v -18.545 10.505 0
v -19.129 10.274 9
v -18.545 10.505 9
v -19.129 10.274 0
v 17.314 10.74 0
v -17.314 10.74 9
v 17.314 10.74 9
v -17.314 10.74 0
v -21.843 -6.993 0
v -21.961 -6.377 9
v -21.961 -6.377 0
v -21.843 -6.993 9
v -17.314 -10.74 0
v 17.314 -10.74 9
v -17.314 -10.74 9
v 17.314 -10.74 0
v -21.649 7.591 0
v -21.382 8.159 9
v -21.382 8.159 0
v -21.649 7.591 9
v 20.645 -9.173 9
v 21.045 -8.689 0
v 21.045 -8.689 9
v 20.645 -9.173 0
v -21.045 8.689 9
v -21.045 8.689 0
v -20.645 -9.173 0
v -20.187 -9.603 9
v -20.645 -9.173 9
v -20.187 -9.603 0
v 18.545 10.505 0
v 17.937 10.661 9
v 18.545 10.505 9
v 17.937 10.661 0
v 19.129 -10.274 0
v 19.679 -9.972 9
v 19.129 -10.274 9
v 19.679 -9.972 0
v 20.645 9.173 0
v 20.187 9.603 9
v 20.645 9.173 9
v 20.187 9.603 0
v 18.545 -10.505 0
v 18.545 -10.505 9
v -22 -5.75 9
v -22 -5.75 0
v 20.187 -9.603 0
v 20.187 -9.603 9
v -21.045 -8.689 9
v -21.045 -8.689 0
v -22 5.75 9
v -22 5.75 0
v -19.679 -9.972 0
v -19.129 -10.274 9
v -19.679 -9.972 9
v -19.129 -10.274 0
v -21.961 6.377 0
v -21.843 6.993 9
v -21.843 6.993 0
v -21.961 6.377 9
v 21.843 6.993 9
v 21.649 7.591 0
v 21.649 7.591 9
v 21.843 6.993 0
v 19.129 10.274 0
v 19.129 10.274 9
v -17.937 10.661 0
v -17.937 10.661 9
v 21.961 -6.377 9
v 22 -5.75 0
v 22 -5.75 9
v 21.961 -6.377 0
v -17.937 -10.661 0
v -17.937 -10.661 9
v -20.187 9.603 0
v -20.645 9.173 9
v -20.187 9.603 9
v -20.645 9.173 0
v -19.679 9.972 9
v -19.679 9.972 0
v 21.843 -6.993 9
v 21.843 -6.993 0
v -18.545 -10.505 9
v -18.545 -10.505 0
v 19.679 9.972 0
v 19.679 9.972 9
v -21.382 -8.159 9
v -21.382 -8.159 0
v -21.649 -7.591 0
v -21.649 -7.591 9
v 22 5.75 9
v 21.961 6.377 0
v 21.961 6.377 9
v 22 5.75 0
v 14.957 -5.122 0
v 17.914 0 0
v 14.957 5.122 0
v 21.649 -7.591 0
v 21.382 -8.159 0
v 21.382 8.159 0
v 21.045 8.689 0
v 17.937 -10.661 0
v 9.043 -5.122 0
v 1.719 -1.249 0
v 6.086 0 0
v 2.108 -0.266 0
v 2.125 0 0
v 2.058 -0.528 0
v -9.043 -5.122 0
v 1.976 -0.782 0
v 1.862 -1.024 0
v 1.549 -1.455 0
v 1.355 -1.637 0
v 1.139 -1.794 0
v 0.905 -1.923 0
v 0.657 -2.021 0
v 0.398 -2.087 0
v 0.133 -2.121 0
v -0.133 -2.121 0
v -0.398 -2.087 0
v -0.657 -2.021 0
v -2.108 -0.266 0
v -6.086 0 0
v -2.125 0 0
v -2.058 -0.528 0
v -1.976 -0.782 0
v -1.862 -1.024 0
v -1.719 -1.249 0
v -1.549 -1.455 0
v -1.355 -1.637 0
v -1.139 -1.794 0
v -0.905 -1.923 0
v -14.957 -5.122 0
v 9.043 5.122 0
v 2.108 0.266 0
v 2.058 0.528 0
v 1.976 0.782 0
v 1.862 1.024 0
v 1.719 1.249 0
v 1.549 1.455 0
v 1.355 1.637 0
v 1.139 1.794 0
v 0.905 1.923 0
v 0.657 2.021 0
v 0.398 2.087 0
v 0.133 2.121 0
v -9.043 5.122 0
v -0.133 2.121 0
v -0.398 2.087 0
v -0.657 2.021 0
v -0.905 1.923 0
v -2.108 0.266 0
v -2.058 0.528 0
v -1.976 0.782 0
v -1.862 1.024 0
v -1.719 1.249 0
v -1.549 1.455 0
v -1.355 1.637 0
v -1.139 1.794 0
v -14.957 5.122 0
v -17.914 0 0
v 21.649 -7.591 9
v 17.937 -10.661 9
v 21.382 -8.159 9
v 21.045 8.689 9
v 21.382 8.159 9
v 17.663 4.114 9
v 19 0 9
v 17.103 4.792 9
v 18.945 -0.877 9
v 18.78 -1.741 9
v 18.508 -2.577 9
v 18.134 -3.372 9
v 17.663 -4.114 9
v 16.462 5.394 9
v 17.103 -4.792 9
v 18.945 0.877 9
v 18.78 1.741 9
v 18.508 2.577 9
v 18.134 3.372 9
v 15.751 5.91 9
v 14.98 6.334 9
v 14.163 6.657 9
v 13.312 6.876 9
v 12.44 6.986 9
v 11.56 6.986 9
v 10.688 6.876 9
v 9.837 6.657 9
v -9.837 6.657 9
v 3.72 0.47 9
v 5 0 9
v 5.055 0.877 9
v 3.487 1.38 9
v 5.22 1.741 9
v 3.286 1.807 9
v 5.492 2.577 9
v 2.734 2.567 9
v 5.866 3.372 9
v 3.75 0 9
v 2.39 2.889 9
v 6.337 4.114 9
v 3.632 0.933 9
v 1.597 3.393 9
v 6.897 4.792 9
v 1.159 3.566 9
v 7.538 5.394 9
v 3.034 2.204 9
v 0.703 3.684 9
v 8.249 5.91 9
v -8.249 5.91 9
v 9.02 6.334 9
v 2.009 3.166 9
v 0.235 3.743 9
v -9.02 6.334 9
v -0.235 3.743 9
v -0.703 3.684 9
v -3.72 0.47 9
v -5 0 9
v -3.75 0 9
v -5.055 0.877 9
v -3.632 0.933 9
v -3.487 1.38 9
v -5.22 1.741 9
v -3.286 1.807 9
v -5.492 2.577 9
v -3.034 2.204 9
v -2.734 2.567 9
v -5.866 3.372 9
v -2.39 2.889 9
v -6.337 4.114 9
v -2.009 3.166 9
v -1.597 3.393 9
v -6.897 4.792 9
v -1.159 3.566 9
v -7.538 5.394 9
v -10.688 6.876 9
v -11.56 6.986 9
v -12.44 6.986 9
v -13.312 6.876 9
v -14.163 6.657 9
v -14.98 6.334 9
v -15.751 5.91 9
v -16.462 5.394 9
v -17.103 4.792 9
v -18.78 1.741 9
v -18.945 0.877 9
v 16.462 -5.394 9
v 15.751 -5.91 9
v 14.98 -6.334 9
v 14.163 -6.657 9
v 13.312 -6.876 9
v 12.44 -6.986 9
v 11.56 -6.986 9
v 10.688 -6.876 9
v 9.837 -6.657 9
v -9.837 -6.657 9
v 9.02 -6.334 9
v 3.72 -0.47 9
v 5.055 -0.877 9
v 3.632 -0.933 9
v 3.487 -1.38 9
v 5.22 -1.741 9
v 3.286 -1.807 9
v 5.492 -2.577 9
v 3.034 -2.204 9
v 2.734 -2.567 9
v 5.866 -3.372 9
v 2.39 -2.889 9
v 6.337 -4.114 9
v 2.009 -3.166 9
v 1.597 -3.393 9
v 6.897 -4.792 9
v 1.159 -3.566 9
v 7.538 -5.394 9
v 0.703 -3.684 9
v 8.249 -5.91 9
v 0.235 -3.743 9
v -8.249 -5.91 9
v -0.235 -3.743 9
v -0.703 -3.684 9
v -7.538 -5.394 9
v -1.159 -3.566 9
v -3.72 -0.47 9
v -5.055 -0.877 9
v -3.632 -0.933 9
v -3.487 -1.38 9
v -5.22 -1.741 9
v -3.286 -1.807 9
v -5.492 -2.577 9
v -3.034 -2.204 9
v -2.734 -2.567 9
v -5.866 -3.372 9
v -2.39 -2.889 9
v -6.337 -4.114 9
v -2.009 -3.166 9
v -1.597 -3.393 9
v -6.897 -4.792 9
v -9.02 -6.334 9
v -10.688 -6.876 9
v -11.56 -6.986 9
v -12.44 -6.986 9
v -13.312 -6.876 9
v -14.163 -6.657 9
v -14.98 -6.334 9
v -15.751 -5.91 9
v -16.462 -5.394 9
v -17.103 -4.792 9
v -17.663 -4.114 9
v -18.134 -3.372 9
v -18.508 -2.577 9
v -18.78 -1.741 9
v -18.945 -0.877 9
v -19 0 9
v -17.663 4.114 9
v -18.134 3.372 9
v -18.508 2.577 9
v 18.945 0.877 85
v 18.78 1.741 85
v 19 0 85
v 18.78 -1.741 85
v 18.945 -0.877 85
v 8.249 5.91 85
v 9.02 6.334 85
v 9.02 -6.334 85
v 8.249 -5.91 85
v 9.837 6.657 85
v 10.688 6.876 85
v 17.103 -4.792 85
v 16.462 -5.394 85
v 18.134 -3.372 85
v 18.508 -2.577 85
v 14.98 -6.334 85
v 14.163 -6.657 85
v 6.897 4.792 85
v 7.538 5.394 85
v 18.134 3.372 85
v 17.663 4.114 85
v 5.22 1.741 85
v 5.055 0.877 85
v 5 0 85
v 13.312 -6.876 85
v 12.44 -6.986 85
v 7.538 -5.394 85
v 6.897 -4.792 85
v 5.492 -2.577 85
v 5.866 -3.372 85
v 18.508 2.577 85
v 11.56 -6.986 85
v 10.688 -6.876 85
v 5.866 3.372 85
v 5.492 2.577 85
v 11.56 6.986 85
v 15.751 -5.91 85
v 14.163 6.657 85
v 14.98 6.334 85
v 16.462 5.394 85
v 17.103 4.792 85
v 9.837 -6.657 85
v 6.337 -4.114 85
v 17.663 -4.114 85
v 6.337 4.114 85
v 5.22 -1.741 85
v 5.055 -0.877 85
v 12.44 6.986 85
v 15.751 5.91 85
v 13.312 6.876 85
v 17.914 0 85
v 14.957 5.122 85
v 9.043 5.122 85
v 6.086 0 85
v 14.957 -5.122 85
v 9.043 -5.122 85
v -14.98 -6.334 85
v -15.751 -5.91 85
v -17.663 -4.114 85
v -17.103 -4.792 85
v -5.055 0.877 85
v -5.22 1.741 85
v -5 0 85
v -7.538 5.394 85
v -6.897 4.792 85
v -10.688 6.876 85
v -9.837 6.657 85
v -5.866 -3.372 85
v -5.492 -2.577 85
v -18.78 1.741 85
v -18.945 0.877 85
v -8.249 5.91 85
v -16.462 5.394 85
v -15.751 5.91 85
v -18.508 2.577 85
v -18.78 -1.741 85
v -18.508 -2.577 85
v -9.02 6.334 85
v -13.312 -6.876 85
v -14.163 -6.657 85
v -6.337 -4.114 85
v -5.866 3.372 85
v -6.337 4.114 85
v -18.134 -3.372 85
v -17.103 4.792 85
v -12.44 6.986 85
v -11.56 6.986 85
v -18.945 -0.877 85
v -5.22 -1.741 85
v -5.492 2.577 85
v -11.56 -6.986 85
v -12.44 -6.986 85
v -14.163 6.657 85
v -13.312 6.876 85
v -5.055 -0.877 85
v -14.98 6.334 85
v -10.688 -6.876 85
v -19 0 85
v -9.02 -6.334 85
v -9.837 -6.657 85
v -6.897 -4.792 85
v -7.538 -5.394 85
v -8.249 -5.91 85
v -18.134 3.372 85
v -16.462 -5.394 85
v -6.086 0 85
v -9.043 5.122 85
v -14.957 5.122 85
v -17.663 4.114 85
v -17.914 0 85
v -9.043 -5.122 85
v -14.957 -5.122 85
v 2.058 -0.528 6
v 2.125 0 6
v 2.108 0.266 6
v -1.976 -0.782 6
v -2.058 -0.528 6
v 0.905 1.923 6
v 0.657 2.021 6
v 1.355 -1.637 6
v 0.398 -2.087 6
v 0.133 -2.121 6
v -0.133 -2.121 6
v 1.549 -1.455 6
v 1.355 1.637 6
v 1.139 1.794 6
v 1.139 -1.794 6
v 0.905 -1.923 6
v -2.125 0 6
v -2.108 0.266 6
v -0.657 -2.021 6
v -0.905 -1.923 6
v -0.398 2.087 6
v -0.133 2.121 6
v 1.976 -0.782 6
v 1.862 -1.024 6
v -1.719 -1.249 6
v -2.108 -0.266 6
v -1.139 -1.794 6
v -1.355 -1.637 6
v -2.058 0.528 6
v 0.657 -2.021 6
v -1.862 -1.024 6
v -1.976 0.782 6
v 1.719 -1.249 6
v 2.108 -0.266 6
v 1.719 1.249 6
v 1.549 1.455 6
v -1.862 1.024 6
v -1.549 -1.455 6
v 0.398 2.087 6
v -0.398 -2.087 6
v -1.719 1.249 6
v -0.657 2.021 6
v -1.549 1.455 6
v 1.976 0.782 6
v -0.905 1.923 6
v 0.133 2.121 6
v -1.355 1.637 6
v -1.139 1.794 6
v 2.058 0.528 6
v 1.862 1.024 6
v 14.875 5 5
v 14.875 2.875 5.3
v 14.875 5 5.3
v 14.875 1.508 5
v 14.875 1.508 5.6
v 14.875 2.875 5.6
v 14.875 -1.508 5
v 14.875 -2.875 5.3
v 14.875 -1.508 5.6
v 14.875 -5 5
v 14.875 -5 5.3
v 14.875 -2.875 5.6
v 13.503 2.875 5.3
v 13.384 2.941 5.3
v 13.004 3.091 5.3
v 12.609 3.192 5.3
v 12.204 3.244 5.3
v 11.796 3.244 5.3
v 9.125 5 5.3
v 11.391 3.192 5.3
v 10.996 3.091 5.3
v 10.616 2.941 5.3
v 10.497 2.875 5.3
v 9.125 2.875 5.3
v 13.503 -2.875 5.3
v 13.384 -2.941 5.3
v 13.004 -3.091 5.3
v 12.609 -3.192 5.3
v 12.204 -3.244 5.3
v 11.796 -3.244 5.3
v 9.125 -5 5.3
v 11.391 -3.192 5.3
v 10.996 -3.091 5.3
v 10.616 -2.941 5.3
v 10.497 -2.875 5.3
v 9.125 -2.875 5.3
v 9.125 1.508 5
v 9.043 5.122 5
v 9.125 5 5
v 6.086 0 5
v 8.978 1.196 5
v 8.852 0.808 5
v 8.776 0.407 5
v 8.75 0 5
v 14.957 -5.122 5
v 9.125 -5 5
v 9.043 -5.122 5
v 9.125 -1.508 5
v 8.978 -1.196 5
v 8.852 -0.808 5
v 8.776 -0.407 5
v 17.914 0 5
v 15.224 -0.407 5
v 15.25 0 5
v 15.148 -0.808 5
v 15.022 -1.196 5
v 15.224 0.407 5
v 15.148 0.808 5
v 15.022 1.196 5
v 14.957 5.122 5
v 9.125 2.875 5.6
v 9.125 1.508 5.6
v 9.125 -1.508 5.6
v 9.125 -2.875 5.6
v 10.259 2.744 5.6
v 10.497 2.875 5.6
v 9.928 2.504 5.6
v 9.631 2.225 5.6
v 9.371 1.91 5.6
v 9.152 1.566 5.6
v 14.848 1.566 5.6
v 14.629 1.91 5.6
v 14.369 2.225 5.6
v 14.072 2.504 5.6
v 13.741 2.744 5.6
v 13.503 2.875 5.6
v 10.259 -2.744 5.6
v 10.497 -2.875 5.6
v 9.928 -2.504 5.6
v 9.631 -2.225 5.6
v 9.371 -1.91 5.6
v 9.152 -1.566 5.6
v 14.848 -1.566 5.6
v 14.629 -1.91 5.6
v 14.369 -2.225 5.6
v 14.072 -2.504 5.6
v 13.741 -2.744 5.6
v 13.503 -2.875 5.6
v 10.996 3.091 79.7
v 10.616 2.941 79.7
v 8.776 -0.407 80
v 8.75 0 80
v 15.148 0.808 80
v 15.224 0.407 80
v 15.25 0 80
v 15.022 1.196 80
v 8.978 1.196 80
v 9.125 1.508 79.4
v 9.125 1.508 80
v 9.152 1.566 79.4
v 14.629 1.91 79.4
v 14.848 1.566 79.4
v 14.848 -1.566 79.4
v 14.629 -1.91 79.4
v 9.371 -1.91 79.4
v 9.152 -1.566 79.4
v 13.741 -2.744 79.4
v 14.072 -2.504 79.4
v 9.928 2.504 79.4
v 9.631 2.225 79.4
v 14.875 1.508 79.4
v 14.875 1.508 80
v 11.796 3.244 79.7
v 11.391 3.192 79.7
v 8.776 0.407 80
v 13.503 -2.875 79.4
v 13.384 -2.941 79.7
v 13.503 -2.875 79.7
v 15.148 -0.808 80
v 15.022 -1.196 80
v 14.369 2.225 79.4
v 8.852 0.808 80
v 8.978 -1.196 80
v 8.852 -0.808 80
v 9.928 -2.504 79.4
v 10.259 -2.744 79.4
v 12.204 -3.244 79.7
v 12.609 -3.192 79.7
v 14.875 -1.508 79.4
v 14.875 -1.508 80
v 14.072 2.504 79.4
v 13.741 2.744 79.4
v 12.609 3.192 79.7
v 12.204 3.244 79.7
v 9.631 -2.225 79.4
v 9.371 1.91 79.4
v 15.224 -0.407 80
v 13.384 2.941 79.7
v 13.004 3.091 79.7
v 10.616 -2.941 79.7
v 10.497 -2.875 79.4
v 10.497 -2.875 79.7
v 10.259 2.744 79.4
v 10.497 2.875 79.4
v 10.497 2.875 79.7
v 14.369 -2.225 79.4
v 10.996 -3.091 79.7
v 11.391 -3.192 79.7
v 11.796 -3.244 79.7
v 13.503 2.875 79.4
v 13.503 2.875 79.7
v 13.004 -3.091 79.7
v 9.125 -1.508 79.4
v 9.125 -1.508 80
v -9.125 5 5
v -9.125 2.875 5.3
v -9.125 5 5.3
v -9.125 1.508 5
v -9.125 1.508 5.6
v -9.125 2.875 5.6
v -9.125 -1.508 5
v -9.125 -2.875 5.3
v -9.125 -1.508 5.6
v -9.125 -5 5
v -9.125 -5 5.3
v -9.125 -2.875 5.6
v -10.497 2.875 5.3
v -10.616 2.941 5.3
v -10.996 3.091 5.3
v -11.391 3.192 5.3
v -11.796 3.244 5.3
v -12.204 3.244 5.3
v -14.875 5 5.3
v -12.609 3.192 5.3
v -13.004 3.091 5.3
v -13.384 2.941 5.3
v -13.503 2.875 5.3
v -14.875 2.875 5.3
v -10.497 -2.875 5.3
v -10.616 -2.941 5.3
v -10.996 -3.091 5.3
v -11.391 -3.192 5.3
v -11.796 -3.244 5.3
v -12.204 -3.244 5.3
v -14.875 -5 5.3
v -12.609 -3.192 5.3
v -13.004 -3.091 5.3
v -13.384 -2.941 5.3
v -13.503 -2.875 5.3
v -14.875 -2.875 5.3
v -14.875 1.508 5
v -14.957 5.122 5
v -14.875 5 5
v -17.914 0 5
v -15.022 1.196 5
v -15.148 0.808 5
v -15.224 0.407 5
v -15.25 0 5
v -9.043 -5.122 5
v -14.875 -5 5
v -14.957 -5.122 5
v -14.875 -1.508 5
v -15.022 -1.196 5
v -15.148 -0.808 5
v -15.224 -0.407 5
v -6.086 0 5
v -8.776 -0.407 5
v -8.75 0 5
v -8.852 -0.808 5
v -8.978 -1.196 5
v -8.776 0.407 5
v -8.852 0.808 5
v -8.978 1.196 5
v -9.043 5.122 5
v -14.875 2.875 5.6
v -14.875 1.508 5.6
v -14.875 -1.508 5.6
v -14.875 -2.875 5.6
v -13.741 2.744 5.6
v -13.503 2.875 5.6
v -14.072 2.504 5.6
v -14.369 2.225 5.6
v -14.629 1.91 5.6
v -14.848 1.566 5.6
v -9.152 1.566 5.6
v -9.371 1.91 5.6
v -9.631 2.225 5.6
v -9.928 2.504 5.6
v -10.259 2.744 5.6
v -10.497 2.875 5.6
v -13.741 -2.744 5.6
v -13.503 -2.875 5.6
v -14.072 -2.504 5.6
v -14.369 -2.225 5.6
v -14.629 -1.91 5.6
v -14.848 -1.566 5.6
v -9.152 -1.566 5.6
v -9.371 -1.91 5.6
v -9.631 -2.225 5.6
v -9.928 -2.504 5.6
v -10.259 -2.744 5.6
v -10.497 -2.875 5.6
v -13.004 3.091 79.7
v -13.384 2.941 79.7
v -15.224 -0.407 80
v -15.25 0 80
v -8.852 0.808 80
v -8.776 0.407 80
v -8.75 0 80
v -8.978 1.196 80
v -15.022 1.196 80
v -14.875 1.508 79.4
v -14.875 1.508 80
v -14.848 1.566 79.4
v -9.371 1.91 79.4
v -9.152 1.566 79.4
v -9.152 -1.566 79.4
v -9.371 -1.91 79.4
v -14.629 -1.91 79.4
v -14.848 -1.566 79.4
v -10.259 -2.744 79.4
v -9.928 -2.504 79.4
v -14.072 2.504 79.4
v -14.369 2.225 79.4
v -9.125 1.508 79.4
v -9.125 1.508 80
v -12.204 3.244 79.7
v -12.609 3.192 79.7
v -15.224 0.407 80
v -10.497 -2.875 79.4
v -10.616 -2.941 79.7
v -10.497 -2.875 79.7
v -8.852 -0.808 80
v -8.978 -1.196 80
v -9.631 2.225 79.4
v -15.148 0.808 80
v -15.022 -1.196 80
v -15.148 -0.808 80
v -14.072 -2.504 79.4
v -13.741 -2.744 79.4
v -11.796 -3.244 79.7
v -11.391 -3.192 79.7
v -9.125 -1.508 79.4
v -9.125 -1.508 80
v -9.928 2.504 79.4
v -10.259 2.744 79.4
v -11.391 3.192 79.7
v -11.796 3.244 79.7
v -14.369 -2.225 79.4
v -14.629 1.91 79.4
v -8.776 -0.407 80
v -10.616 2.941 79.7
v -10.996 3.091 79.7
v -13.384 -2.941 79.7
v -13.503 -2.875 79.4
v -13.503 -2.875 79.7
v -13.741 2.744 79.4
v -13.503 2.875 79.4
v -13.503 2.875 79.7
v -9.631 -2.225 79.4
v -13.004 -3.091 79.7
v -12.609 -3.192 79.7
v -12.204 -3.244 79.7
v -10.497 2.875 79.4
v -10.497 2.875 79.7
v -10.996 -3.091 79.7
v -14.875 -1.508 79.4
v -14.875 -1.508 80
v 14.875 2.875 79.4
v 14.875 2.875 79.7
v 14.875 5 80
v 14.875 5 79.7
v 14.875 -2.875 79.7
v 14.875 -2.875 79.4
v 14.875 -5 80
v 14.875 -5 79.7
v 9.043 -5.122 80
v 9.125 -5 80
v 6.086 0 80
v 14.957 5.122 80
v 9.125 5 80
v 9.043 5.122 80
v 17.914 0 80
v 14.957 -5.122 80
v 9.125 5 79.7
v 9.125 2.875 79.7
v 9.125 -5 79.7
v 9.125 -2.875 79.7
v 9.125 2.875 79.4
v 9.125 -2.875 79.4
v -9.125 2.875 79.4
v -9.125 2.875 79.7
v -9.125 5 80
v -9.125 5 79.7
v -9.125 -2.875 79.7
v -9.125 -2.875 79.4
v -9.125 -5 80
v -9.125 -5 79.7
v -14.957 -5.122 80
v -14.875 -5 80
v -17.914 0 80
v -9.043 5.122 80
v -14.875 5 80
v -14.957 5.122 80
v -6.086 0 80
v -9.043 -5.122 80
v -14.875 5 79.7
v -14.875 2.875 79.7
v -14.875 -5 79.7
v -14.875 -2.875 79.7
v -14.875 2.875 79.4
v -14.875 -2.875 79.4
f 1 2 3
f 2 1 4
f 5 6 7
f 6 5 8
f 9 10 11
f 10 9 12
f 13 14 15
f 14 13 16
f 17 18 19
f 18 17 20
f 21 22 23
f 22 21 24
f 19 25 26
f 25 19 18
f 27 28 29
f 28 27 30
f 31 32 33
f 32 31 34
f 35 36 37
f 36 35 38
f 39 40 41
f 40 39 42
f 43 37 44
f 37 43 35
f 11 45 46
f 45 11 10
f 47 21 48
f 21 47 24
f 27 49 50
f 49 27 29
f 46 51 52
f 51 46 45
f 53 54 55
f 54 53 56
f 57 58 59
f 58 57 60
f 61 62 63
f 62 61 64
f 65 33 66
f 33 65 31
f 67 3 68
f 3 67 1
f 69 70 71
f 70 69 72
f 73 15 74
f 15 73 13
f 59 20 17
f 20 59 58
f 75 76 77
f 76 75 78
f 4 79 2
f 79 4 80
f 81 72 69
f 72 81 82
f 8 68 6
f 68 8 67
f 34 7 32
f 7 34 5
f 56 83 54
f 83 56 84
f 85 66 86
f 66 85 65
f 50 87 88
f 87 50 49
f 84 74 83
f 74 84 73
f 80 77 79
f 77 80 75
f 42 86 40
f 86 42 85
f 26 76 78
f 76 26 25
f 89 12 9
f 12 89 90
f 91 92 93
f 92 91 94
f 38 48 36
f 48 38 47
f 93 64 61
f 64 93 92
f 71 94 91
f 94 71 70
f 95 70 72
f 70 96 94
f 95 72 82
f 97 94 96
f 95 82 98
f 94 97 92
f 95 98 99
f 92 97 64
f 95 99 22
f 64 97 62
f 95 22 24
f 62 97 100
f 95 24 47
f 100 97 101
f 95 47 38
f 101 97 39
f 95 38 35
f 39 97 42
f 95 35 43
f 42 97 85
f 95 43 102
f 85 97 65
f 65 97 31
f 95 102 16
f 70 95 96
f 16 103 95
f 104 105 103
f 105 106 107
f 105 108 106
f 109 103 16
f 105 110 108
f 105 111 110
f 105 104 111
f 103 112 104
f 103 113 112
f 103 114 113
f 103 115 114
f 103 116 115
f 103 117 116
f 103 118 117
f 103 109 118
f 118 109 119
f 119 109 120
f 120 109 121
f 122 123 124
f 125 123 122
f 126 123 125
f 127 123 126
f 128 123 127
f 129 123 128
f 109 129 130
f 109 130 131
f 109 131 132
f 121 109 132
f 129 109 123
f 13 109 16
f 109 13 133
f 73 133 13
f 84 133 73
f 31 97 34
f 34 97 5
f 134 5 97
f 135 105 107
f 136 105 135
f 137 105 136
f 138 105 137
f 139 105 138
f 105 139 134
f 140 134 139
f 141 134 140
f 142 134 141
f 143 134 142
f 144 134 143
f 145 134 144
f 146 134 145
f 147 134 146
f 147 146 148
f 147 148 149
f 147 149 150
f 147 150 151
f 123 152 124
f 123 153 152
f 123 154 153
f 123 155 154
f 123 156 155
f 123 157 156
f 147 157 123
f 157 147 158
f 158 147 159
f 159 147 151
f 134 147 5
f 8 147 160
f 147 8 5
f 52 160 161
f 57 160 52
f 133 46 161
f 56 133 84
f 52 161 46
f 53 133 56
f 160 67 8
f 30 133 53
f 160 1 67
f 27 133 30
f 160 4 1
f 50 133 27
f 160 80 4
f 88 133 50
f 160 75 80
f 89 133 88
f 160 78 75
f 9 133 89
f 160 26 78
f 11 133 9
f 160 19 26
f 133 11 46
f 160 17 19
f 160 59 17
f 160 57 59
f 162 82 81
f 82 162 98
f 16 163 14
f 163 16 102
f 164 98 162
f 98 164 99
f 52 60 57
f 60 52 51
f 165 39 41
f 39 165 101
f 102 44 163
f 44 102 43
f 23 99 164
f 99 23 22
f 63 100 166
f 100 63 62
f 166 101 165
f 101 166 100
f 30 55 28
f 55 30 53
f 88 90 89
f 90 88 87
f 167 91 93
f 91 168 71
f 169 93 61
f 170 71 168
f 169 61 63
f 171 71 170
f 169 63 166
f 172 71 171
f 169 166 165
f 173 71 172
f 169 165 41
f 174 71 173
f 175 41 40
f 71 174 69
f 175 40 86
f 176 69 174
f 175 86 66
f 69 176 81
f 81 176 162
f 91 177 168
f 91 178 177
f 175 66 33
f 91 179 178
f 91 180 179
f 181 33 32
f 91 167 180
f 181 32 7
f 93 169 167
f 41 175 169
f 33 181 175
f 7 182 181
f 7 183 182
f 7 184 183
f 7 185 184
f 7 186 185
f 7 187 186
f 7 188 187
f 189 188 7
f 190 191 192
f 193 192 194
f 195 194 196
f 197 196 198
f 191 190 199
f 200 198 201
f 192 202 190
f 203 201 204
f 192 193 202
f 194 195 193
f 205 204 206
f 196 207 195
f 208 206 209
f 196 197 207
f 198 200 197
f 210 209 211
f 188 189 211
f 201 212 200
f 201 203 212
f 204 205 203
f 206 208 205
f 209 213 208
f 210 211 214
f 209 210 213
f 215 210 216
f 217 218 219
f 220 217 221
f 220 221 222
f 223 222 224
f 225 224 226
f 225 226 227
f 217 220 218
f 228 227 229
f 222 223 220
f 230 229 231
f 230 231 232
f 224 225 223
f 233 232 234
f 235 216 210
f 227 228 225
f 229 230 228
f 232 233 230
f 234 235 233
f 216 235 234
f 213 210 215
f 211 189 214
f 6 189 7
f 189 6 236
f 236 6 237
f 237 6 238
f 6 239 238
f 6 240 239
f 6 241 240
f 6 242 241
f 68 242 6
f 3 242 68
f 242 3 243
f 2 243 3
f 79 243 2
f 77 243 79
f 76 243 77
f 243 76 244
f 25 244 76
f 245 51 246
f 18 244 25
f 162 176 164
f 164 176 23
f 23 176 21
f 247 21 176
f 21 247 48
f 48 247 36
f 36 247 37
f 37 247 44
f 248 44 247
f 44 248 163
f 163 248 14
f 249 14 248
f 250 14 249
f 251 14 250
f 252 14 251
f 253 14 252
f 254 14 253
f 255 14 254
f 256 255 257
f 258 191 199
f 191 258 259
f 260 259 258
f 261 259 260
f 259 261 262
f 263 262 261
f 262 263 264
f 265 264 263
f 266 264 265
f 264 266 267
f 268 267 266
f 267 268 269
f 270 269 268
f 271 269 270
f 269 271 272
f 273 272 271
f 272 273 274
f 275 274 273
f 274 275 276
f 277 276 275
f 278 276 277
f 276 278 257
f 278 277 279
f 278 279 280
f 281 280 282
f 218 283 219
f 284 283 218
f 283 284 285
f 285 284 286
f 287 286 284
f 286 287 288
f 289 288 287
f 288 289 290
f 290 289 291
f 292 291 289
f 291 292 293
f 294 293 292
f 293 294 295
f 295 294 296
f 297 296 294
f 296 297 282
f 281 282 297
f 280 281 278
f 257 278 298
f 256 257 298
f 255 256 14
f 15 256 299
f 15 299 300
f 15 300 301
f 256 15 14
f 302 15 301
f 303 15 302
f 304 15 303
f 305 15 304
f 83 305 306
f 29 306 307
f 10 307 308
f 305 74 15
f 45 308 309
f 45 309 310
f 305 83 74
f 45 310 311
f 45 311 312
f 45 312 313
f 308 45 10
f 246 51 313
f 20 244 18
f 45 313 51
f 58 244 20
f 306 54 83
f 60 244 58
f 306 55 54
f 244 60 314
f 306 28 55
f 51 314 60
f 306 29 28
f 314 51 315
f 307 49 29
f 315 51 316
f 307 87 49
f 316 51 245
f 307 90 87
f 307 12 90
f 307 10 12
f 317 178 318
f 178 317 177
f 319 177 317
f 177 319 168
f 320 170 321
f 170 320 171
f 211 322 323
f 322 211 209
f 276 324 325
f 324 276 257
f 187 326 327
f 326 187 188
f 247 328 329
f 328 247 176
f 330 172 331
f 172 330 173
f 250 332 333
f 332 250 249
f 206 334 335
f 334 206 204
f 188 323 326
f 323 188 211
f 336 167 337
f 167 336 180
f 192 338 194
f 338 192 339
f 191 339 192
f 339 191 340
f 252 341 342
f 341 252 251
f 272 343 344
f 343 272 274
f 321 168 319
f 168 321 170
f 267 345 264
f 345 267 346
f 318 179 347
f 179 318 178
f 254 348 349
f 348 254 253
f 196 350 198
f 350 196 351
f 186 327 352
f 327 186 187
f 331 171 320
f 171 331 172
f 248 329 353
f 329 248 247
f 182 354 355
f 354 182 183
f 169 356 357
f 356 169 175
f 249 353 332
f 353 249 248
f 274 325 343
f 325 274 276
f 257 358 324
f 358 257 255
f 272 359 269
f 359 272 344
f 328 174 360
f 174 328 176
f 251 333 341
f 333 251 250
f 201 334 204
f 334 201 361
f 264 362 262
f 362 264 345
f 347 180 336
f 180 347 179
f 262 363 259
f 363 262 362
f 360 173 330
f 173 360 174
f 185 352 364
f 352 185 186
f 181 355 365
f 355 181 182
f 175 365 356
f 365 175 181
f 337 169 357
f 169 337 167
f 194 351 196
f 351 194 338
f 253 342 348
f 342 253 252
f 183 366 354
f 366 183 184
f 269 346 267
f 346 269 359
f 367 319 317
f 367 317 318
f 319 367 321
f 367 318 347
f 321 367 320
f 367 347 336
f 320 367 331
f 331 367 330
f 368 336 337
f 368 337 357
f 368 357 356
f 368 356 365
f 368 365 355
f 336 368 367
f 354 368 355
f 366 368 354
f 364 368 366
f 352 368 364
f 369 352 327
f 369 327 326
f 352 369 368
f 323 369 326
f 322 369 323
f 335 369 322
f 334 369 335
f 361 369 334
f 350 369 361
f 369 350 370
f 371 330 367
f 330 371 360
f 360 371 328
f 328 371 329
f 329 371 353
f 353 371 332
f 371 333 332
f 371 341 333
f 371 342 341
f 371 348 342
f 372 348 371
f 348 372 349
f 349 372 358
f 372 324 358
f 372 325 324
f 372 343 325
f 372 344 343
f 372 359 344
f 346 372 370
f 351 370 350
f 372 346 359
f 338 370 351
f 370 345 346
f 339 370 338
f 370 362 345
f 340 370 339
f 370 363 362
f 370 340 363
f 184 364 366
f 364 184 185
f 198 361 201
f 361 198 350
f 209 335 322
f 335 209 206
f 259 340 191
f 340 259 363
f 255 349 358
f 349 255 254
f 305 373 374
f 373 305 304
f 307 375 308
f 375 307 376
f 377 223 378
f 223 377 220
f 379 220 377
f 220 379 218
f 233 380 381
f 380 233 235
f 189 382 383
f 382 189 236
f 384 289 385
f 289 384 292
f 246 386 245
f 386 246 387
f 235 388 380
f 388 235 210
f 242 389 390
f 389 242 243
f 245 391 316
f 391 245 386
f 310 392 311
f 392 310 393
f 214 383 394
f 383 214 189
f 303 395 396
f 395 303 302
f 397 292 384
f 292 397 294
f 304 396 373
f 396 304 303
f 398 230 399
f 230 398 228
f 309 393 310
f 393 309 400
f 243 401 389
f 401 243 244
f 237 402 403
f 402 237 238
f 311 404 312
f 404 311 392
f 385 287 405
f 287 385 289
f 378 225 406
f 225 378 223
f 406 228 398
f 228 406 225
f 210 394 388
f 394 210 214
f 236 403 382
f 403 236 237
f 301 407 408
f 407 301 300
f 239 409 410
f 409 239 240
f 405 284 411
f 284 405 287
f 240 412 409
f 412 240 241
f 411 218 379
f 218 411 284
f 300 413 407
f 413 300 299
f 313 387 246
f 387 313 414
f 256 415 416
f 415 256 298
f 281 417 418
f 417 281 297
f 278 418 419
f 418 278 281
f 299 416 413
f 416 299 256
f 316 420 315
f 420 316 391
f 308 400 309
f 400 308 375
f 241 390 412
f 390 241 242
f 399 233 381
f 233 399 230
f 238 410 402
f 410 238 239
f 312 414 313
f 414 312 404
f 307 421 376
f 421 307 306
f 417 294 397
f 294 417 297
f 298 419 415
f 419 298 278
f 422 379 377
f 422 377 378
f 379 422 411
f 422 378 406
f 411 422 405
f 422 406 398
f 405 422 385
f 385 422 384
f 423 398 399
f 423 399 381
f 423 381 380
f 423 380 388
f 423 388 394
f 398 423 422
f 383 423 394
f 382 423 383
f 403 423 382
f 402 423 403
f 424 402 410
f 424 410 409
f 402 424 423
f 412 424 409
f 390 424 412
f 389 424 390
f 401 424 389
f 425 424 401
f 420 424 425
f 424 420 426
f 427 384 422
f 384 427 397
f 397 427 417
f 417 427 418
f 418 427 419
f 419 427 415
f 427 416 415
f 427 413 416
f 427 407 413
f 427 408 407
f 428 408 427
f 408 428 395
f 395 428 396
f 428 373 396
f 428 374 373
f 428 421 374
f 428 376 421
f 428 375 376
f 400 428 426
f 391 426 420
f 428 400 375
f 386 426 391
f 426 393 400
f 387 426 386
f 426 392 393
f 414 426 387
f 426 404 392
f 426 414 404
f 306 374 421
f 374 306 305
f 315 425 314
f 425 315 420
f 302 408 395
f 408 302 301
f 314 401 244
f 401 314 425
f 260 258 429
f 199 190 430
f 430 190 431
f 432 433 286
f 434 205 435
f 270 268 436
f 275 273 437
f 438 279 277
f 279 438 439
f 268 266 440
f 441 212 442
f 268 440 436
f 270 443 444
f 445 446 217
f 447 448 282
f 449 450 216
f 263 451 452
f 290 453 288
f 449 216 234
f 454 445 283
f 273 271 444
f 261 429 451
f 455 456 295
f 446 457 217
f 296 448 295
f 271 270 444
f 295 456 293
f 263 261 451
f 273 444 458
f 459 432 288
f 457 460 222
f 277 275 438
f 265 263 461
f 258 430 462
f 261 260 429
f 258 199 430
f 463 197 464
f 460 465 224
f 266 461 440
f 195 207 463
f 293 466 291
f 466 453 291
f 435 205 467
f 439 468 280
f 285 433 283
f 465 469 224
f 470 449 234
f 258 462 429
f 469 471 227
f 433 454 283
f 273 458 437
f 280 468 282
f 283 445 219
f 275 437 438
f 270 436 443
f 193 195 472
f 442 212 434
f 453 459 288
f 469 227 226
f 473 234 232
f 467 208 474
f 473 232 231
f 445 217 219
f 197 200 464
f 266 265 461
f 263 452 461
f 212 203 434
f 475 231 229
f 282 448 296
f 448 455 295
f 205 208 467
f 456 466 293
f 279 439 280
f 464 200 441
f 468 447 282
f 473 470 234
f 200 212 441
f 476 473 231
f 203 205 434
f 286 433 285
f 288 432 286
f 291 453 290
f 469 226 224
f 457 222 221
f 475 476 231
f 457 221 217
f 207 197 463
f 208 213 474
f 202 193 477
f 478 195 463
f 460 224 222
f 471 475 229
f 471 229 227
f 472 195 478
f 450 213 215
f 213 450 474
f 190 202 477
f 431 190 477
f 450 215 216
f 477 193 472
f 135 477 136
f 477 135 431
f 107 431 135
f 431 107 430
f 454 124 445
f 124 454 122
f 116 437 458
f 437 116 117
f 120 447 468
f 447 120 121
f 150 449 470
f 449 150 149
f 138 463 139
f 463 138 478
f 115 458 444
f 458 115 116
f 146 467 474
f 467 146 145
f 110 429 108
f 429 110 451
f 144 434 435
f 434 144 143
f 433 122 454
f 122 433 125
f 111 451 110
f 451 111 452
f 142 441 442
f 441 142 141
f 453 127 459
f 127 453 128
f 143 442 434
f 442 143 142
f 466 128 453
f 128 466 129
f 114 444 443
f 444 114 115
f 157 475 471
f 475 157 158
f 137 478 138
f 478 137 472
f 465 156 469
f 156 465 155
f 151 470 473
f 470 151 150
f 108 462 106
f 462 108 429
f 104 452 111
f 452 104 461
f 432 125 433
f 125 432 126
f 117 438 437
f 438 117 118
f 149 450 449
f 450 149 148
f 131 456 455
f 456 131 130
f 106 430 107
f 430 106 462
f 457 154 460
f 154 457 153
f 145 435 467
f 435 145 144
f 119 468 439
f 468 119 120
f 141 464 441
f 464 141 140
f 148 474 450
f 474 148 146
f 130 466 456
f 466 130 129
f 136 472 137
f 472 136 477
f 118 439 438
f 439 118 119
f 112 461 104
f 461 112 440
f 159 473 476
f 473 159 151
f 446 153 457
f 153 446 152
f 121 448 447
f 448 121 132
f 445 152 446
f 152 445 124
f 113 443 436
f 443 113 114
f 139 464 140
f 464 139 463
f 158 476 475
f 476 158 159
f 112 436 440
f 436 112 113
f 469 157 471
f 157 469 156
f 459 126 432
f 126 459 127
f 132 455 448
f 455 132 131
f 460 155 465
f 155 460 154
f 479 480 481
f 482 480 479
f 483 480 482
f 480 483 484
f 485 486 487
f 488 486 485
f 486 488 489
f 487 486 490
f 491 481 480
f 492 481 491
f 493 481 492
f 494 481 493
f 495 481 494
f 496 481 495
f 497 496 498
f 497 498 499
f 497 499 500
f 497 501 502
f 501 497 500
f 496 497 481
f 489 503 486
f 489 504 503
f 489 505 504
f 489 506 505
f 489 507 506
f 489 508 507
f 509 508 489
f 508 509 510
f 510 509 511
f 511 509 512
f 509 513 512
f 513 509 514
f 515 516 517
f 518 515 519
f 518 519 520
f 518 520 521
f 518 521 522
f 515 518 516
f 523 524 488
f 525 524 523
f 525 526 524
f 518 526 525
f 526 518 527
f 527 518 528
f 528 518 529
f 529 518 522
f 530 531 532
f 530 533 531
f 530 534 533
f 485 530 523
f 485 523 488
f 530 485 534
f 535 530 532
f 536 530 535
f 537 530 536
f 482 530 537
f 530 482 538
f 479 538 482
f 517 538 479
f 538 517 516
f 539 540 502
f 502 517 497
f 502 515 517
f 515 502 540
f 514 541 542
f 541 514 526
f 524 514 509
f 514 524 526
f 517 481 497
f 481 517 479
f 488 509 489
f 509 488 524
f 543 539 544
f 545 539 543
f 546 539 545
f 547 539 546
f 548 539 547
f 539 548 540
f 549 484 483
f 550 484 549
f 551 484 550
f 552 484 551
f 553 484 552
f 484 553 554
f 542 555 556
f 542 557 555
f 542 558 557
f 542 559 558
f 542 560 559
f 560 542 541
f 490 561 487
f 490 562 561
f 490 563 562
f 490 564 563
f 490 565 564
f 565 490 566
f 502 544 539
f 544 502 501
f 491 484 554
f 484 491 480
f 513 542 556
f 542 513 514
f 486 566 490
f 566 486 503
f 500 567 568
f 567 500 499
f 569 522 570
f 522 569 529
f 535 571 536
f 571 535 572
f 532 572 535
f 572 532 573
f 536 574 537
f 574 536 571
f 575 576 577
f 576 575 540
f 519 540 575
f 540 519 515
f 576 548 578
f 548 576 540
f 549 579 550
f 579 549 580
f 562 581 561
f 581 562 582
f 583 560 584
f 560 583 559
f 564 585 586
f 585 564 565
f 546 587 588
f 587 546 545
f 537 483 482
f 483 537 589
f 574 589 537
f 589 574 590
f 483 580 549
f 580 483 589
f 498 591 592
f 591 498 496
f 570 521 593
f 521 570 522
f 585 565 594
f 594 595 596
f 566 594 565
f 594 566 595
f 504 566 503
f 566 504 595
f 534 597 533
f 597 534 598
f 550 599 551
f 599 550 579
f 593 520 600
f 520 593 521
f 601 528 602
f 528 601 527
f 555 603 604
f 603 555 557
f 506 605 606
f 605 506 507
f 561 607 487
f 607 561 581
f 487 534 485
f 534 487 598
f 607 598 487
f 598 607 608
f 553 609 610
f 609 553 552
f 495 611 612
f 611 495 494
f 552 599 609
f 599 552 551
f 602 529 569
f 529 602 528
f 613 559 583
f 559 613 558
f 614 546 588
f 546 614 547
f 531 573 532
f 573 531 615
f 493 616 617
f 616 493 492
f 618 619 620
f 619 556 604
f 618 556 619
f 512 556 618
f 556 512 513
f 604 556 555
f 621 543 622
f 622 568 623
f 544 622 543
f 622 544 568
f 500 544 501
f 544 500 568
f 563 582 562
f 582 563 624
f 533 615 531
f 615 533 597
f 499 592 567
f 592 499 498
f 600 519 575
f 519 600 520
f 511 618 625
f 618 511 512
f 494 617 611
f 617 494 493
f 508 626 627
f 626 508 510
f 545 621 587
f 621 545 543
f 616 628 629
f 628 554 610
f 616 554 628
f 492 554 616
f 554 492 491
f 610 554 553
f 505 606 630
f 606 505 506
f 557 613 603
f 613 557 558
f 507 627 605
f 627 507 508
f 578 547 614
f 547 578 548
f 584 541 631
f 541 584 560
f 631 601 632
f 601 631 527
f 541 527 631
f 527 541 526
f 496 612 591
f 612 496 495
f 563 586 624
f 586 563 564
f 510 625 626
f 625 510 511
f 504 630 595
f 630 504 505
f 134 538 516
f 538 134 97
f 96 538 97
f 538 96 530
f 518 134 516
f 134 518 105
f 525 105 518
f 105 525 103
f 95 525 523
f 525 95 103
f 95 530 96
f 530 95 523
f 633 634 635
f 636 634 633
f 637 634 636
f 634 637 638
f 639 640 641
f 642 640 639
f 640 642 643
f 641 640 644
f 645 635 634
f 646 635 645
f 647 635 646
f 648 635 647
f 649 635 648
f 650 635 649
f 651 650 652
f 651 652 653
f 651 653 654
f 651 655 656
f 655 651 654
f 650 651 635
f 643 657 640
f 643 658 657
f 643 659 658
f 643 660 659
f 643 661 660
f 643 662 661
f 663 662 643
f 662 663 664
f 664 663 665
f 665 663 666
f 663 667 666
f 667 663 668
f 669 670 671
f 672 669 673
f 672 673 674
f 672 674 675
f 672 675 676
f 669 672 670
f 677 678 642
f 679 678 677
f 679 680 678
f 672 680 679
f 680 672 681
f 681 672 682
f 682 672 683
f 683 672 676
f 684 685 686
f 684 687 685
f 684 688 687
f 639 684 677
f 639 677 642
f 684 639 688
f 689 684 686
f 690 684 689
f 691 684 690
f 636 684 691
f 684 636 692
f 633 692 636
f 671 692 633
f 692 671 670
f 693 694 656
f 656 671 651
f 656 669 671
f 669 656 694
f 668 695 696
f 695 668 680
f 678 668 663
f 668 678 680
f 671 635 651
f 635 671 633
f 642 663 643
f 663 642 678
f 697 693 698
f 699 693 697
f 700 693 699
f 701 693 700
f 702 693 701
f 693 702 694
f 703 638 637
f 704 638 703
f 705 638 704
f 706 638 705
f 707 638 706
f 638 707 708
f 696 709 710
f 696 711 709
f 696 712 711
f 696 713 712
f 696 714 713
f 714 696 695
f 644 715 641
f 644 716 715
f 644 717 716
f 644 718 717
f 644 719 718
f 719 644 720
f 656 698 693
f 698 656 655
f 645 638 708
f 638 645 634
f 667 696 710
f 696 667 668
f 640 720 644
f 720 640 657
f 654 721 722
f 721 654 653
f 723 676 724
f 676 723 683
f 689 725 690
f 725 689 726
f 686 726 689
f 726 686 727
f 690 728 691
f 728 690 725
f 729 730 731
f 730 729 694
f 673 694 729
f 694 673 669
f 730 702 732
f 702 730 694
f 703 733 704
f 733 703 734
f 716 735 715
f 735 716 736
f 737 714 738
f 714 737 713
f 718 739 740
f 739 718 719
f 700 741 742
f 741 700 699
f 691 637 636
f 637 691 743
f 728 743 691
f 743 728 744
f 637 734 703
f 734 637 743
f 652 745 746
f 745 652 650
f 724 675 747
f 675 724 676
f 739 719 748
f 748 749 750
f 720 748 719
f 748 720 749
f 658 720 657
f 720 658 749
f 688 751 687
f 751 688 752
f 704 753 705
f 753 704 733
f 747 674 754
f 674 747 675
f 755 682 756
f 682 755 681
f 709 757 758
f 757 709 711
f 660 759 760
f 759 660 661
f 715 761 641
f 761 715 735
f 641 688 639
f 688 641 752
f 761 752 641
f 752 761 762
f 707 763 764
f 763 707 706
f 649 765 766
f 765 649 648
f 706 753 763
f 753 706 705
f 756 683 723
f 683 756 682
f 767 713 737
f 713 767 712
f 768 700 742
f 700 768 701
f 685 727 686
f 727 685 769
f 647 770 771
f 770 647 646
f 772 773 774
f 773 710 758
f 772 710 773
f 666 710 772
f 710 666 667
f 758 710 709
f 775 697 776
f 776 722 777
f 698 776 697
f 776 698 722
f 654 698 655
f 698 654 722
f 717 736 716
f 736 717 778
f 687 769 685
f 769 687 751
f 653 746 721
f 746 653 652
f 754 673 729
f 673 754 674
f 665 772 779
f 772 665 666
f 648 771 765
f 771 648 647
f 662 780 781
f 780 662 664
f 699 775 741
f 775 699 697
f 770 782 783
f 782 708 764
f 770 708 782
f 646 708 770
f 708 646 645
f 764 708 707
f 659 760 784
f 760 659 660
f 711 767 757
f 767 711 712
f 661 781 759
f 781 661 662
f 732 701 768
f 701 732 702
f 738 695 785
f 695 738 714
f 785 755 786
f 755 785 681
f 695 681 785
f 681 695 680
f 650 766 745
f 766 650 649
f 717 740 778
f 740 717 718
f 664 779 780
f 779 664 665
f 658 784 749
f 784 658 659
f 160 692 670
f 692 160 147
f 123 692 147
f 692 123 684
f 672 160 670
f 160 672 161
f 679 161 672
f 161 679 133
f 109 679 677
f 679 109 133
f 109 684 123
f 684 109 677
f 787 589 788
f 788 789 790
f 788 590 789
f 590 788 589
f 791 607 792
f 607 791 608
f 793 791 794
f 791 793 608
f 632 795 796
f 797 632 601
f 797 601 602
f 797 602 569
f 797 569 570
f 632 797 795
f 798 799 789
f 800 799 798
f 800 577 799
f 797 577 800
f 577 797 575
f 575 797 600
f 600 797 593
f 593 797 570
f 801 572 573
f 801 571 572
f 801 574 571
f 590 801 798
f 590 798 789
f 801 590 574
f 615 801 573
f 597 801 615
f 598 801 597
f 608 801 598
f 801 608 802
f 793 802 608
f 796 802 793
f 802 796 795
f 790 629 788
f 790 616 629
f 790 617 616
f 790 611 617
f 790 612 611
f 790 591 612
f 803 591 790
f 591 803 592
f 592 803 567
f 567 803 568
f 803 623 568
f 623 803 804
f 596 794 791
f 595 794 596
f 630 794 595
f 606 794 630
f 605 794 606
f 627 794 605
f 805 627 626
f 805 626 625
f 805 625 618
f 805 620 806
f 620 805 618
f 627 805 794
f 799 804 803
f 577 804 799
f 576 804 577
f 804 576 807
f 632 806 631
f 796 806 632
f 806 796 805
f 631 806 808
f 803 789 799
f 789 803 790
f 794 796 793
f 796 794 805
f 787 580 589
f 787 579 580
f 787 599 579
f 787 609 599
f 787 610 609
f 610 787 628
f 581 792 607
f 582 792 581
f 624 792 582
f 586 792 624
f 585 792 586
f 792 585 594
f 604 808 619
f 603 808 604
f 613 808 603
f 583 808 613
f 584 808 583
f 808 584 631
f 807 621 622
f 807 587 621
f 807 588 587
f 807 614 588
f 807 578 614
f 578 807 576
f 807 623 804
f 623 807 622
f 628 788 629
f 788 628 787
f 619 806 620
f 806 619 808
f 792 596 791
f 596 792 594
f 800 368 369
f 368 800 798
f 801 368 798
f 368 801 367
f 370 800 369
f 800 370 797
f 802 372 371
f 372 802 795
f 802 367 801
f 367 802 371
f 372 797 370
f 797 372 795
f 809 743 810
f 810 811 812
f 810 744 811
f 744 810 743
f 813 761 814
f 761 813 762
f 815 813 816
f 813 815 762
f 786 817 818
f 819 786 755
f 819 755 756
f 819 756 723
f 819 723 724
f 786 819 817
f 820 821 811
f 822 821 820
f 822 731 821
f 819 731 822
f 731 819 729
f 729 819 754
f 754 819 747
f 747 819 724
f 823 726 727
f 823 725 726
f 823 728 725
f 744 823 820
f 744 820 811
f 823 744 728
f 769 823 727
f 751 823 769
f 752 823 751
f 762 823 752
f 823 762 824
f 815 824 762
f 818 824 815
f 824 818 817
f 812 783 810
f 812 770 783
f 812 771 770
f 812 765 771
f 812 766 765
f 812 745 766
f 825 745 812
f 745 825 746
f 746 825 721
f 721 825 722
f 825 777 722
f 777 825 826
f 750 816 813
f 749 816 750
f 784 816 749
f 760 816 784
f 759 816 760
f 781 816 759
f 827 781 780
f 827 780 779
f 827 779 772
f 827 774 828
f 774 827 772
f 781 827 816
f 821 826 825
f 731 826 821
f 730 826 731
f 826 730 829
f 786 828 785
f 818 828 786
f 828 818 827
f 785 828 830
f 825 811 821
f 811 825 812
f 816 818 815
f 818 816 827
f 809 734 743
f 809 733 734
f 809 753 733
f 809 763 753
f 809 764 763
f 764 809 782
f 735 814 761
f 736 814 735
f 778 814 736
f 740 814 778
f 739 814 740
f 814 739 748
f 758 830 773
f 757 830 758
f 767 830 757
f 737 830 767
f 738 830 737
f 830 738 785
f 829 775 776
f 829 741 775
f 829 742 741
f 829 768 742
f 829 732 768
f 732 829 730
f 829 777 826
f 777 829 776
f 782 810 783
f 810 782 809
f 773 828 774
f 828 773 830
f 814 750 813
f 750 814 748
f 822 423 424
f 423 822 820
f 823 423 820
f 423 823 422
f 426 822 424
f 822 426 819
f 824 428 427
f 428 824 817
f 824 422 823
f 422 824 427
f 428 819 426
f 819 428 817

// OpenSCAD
$fn = 50;


difference() {
	union() {
		hull() {
			translate(v = [-17.0000000000, 5.7500000000, 0]) {
				cylinder(h = 9, r = 5);
			}
			translate(v = [17.0000000000, 5.7500000000, 0]) {
				cylinder(h = 9, r = 5);
			}
			translate(v = [-17.0000000000, -5.7500000000, 0]) {
				cylinder(h = 9, r = 5);
			}
			translate(v = [17.0000000000, -5.7500000000, 0]) {
				cylinder(h = 9, r = 5);
			}
		}
		translate(v = [12.0000000000, 0, 0.0000000000]) {
			cylinder(h = 85, r = 7.0000000000);
		}
		translate(v = [-12.0000000000, 0, 0.0000000000]) {
			cylinder(h = 85, r = 7.0000000000);
		}
	}
	union() {
		translate(v = [0, 0, 9]) {
			rotate(a = [0, 0, 0]) {
				difference() {
					union() {
						#translate(v = [0, 0, -80.0000000000]) {
							cylinder(h = 80, r = 2.0000000000);
						}
						#translate(v = [0, 0, -3]) {
							cylinder(h = 3, r1 = 2.1250000000, r2 = 3.7500000000);
						}
						#translate(v = [0, 0, -80.0000000000]) {
							cylinder(h = 80, r = 2.1250000000);
						}
						#translate(v = [0, 0, -80.0000000000]) {
							cylinder(h = 80, r = 2.0000000000);
						}
					}
					union();
				}
			}
		}
		translate(v = [12.0000000000, 0, 0]) {
			rotate(a = [0, 0, 0]) {
				difference() {
					union() {
						#translate(v = [-2.8750000000, -5.0000000000, -0.3000000000]) {
							cube(size = [5.7500000000, 10, 0.3000000000]);
						}
						#translate(v = [-2.8750000000, -2.8750000000, -0.6000000000]) {
							cube(size = [5.7500000000, 5.7500000000, 0.3000000000]);
						}
						#translate(v = [-2.8750000000, -5.0000000000, 5]) {
							cube(size = [5.7500000000, 10, 0.3000000000]);
						}
						#translate(v = [-2.8750000000, -2.8750000000, 5.3000000000]) {
							cube(size = [5.7500000000, 5.7500000000, 0.3000000000]);
						}
						#translate(v = [0, 0, -100.0000000000]) {
							cylinder(h = 200, r = 3.2500000000);
						}
						#linear_extrude(height = 5) {
							polygon(points = [[5.9142500000, 0.0000000000], [2.9571250000, 5.1218907443], [-2.9571250000, 5.1218907443], [-5.9142500000, 0.0000000000], [-2.9571250000, -5.1218907443], [2.9571250000, -5.1218907443]]);
						}
						#translate(v = [-2.8750000000, -5.0000000000, -0.3000000000]) {
							cube(size = [5.7500000000, 10, 0.3000000000]);
						}
						#translate(v = [-2.8750000000, -2.8750000000, -0.6000000000]) {
							cube(size = [5.7500000000, 5.7500000000, 0.3000000000]);
						}
						#translate(v = [-2.8750000000, -5.0000000000, 5]) {
							cube(size = [5.7500000000, 10, 0.3000000000]);
						}
						#translate(v = [-2.8750000000, -2.8750000000, 5.3000000000]) {
							cube(size = [5.7500000000, 5.7500000000, 0.3000000000]);
						}
						#translate(v = [0, 0, -100.0000000000]) {
							cylinder(h = 200, r = 3.2500000000);
						}
						#translate(v = [-2.8750000000, -5.0000000000, -0.3000000000]) {
							cube(size = [5.7500000000, 10, 0.3000000000]);
						}
						#translate(v = [-2.8750000000, -2.8750000000, -0.6000000000]) {
							cube(size = [5.7500000000, 5.7500000000, 0.3000000000]);
						}
						#translate(v = [-2.8750000000, -5.0000000000, 5]) {
							cube(size = [5.7500000000, 10, 0.3000000000]);
						}
						#translate(v = [-2.8750000000, -2.8750000000, 5.3000000000]) {
							cube(size = [5.7500000000, 5.7500000000, 0.3000000000]);
						}
						#translate(v = [0, 0, -100.0000000000]) {
							cylinder(h = 200, r = 3.2500000000);
						}
					}
					union();
				}
			}
		}
		translate(v = [-12.0000000000, 0, 0]) {
			rotate(a = [0, 0, 0]) {
				difference() {
					union() {
						#translate(v = [-2.8750000000, -5.0000000000, -0.3000000000]) {
							cube(size = [5.7500000000, 10, 0.3000000000]);
						}
						#translate(v = [-2.8750000000, -2.8750000000, -0.6000000000]) {
							cube(size = [5.7500000000, 5.7500000000, 0.3000000000]);
						}
						#translate(v = [-2.8750000000, -5.0000000000, 5]) {
							cube(size = [5.7500000000, 10, 0.3000000000]);
						}
						#translate(v = [-2.8750000000, -2.8750000000, 5.3000000000]) {
							cube(size = [5.7500000000, 5.7500000000, 0.3000000000]);
						}
						#translate(v = [0, 0, -100.0000000000]) {
							cylinder(h = 200, r = 3.2500000000);
						}
						#linear_extrude(height = 5) {
							polygon(points = [[5.9142500000, 0.0000000000], [2.9571250000, 5.1218907443], [-2.9571250000, 5.1218907443], [-5.9142500000, 0.0000000000], [-2.9571250000, -5.1218907443], [2.9571250000, -5.1218907443]]);
						}
						#translate(v = [-2.8750000000, -5.0000000000, -0.3000000000]) {
							cube(size = [5.7500000000, 10, 0.3000000000]);
						}
						#translate(v = [-2.8750000000, -2.8750000000, -0.6000000000]) {
							cube(size = [5.7500000000, 5.7500000000, 0.3000000000]);
						}
						#translate(v = [-2.8750000000, -5.0000000000, 5]) {
							cube(size = [5.7500000000, 10, 0.3000000000]);
						}
						#translate(v = [-2.8750000000, -2.8750000000, 5.3000000000]) {
							cube(size = [5.7500000000, 5.7500000000, 0.3000000000]);
						}
						#translate(v = [0, 0, -100.0000000000]) {
							cylinder(h = 200, r = 3.2500000000);
						}
						#translate(v = [-2.8750000000, -5.0000000000, -0.3000000000]) {
							cube(size = [5.7500000000, 10, 0.3000000000]);
						}
						#translate(v = [-2.8750000000, -2.8750000000, -0.6000000000]) {
							cube(size = [5.7500000000, 5.7500000000, 0.3000000000]);
						}
						#translate(v = [-2.8750000000, -5.0000000000, 5]) {
							cube(size = [5.7500000000, 10, 0.3000000000]);
						}
						#translate(v = [-2.8750000000, -2.8750000000, 5.3000000000]) {
							cube(size = [5.7500000000, 5.7500000000, 0.3000000000]);
						}
						#translate(v = [0, 0, -100.0000000000]) {
							cylinder(h = 200, r = 3.2500000000);
						}
					}
					union();
				}
			}
		}
		translate(v = [12.0000000000, 0, 85]) {
			rotate(a = [0, 0, 0]) {
				difference() {
					union() {
						#translate(v = [-2.8750000000, -5.0000000000, -5.3000000000]) {
							cube(size = [5.7500000000, 10, 0.3000000000]);
						}
						#translate(v = [-2.8750000000, -2.8750000000, -5.6000000000]) {
							cube(size = [5.7500000000, 5.7500000000, 0.3000000000]);
						}
						#translate(v = [-2.8750000000, -5.0000000000, 0]) {
							cube(size = [5.7500000000, 10, 0.3000000000]);
						}
						#translate(v = [-2.8750000000, -2.8750000000, 0.3000000000]) {
							cube(size = [5.7500000000, 5.7500000000, 0.3000000000]);
						}
						#translate(v = [0, 0, -100.0000000000]) {
							cylinder(h = 200, r = 3.2500000000);
						}
						translate(v = [0, 0, -5]) {
							#linear_extrude(height = 5) {
								polygon(points = [[5.9142500000, 0.0000000000], [2.9571250000, 5.1218907443], [-2.9571250000, 5.1218907443], [-5.9142500000, 0.0000000000], [-2.9571250000, -5.1218907443], [2.9571250000, -5.1218907443]]);
							}
						}
						#translate(v = [-2.8750000000, -5.0000000000, -5.3000000000]) {
							cube(size = [5.7500000000, 10, 0.3000000000]);
						}
						#translate(v = [-2.8750000000, -2.8750000000, -5.6000000000]) {
							cube(size = [5.7500000000, 5.7500000000, 0.3000000000]);
						}
						#translate(v = [-2.8750000000, -5.0000000000, 0]) {
							cube(size = [5.7500000000, 10, 0.3000000000]);
						}
						#translate(v = [-2.8750000000, -2.8750000000, 0.3000000000]) {
							cube(size = [5.7500000000, 5.7500000000, 0.3000000000]);
						}
						#translate(v = [0, 0, -100.0000000000]) {
							cylinder(h = 200, r = 3.2500000000);
						}
						#translate(v = [-2.8750000000, -5.0000000000, -5.3000000000]) {
							cube(size = [5.7500000000, 10, 0.3000000000]);
						}
						#translate(v = [-2.8750000000, -2.8750000000, -5.6000000000]) {
							cube(size = [5.7500000000, 5.7500000000, 0.3000000000]);
						}
						#translate(v = [-2.8750000000, -5.0000000000, 0]) {
							cube(size = [5.7500000000, 10, 0.3000000000]);
						}
						#translate(v = [-2.8750000000, -2.8750000000, 0.3000000000]) {
							cube(size = [5.7500000000, 5.7500000000, 0.3000000000]);
						}
						#translate(v = [0, 0, -100.0000000000]) {
							cylinder(h = 200, r = 3.2500000000);
						}
					}
					union();
				}
			}
		}
		translate(v = [-12.0000000000, 0, 85]) {
			rotate(a = [0, 0, 0]) {
				difference() {
					union() {
						#translate(v = [-2.8750000000, -5.0000000000, -5.3000000000]) {
							cube(size = [5.7500000000, 10, 0.3000000000]);
						}
						#translate(v = [-2.8750000000, -2.8750000000, -5.6000000000]) {
							cube(size = [5.7500000000, 5.7500000000, 0.3000000000]);
						}
						#translate(v = [-2.8750000000, -5.0000000000, 0]) {
							cube(size = [5.7500000000, 10, 0.3000000000]);
						}
						#translate(v = [-2.8750000000, -2.8750000000, 0.3000000000]) {
							cube(size = [5.7500000000, 5.7500000000, 0.3000000000]);
						}
						#translate(v = [0, 0, -100.0000000000]) {
							cylinder(h = 200, r = 3.2500000000);
						}
						translate(v = [0, 0, -5]) {
							#linear_extrude(height = 5) {
								polygon(points = [[5.9142500000, 0.0000000000], [2.9571250000, 5.1218907443], [-2.9571250000, 5.1218907443], [-5.9142500000, 0.0000000000], [-2.9571250000, -5.1218907443], [2.9571250000, -5.1218907443]]);
							}
						}
						#translate(v = [-2.8750000000, -5.0000000000, -5.3000000000]) {
							cube(size = [5.7500000000, 10, 0.3000000000]);
						}
						#translate(v = [-2.8750000000, -2.8750000000, -5.6000000000]) {
							cube(size = [5.7500000000, 5.7500000000, 0.3000000000]);
						}
						#translate(v = [-2.8750000000, -5.0000000000, 0]) {
							cube(size = [5.7500000000, 10, 0.3000000000]);
						}
						#translate(v = [-2.8750000000, -2.8750000000, 0.3000000000]) {
							cube(size = [5.7500000000, 5.7500000000, 0.3000000000]);
						}
						#translate(v = [0, 0, -100.0000000000]) {
							cylinder(h = 200, r = 3.2500000000);
						}
						#translate(v = [-2.8750000000, -5.0000000000, -5.3000000000]) {
							cube(size = [5.7500000000, 10, 0.3000000000]);
						}
						#translate(v = [-2.8750000000, -2.8750000000, -5.6000000000]) {
							cube(size = [5.7500000000, 5.7500000000, 0.3000000000]);
						}
						#translate(v = [-2.8750000000, -5.0000000000, 0]) {
							cube(size = [5.7500000000, 10, 0.3000000000]);
						}
						#translate(v = [-2.8750000000, -2.8750000000, 0.3000000000]) {
							cube(size = [5.7500000000, 5.7500000000, 0.3000000000]);
						}
						#translate(v = [0, 0, -100.0000000000]) {
							cylinder(h = 200, r = 3.2500000000);
						}
					}
					union();
				}
			}
		}
	}
}
